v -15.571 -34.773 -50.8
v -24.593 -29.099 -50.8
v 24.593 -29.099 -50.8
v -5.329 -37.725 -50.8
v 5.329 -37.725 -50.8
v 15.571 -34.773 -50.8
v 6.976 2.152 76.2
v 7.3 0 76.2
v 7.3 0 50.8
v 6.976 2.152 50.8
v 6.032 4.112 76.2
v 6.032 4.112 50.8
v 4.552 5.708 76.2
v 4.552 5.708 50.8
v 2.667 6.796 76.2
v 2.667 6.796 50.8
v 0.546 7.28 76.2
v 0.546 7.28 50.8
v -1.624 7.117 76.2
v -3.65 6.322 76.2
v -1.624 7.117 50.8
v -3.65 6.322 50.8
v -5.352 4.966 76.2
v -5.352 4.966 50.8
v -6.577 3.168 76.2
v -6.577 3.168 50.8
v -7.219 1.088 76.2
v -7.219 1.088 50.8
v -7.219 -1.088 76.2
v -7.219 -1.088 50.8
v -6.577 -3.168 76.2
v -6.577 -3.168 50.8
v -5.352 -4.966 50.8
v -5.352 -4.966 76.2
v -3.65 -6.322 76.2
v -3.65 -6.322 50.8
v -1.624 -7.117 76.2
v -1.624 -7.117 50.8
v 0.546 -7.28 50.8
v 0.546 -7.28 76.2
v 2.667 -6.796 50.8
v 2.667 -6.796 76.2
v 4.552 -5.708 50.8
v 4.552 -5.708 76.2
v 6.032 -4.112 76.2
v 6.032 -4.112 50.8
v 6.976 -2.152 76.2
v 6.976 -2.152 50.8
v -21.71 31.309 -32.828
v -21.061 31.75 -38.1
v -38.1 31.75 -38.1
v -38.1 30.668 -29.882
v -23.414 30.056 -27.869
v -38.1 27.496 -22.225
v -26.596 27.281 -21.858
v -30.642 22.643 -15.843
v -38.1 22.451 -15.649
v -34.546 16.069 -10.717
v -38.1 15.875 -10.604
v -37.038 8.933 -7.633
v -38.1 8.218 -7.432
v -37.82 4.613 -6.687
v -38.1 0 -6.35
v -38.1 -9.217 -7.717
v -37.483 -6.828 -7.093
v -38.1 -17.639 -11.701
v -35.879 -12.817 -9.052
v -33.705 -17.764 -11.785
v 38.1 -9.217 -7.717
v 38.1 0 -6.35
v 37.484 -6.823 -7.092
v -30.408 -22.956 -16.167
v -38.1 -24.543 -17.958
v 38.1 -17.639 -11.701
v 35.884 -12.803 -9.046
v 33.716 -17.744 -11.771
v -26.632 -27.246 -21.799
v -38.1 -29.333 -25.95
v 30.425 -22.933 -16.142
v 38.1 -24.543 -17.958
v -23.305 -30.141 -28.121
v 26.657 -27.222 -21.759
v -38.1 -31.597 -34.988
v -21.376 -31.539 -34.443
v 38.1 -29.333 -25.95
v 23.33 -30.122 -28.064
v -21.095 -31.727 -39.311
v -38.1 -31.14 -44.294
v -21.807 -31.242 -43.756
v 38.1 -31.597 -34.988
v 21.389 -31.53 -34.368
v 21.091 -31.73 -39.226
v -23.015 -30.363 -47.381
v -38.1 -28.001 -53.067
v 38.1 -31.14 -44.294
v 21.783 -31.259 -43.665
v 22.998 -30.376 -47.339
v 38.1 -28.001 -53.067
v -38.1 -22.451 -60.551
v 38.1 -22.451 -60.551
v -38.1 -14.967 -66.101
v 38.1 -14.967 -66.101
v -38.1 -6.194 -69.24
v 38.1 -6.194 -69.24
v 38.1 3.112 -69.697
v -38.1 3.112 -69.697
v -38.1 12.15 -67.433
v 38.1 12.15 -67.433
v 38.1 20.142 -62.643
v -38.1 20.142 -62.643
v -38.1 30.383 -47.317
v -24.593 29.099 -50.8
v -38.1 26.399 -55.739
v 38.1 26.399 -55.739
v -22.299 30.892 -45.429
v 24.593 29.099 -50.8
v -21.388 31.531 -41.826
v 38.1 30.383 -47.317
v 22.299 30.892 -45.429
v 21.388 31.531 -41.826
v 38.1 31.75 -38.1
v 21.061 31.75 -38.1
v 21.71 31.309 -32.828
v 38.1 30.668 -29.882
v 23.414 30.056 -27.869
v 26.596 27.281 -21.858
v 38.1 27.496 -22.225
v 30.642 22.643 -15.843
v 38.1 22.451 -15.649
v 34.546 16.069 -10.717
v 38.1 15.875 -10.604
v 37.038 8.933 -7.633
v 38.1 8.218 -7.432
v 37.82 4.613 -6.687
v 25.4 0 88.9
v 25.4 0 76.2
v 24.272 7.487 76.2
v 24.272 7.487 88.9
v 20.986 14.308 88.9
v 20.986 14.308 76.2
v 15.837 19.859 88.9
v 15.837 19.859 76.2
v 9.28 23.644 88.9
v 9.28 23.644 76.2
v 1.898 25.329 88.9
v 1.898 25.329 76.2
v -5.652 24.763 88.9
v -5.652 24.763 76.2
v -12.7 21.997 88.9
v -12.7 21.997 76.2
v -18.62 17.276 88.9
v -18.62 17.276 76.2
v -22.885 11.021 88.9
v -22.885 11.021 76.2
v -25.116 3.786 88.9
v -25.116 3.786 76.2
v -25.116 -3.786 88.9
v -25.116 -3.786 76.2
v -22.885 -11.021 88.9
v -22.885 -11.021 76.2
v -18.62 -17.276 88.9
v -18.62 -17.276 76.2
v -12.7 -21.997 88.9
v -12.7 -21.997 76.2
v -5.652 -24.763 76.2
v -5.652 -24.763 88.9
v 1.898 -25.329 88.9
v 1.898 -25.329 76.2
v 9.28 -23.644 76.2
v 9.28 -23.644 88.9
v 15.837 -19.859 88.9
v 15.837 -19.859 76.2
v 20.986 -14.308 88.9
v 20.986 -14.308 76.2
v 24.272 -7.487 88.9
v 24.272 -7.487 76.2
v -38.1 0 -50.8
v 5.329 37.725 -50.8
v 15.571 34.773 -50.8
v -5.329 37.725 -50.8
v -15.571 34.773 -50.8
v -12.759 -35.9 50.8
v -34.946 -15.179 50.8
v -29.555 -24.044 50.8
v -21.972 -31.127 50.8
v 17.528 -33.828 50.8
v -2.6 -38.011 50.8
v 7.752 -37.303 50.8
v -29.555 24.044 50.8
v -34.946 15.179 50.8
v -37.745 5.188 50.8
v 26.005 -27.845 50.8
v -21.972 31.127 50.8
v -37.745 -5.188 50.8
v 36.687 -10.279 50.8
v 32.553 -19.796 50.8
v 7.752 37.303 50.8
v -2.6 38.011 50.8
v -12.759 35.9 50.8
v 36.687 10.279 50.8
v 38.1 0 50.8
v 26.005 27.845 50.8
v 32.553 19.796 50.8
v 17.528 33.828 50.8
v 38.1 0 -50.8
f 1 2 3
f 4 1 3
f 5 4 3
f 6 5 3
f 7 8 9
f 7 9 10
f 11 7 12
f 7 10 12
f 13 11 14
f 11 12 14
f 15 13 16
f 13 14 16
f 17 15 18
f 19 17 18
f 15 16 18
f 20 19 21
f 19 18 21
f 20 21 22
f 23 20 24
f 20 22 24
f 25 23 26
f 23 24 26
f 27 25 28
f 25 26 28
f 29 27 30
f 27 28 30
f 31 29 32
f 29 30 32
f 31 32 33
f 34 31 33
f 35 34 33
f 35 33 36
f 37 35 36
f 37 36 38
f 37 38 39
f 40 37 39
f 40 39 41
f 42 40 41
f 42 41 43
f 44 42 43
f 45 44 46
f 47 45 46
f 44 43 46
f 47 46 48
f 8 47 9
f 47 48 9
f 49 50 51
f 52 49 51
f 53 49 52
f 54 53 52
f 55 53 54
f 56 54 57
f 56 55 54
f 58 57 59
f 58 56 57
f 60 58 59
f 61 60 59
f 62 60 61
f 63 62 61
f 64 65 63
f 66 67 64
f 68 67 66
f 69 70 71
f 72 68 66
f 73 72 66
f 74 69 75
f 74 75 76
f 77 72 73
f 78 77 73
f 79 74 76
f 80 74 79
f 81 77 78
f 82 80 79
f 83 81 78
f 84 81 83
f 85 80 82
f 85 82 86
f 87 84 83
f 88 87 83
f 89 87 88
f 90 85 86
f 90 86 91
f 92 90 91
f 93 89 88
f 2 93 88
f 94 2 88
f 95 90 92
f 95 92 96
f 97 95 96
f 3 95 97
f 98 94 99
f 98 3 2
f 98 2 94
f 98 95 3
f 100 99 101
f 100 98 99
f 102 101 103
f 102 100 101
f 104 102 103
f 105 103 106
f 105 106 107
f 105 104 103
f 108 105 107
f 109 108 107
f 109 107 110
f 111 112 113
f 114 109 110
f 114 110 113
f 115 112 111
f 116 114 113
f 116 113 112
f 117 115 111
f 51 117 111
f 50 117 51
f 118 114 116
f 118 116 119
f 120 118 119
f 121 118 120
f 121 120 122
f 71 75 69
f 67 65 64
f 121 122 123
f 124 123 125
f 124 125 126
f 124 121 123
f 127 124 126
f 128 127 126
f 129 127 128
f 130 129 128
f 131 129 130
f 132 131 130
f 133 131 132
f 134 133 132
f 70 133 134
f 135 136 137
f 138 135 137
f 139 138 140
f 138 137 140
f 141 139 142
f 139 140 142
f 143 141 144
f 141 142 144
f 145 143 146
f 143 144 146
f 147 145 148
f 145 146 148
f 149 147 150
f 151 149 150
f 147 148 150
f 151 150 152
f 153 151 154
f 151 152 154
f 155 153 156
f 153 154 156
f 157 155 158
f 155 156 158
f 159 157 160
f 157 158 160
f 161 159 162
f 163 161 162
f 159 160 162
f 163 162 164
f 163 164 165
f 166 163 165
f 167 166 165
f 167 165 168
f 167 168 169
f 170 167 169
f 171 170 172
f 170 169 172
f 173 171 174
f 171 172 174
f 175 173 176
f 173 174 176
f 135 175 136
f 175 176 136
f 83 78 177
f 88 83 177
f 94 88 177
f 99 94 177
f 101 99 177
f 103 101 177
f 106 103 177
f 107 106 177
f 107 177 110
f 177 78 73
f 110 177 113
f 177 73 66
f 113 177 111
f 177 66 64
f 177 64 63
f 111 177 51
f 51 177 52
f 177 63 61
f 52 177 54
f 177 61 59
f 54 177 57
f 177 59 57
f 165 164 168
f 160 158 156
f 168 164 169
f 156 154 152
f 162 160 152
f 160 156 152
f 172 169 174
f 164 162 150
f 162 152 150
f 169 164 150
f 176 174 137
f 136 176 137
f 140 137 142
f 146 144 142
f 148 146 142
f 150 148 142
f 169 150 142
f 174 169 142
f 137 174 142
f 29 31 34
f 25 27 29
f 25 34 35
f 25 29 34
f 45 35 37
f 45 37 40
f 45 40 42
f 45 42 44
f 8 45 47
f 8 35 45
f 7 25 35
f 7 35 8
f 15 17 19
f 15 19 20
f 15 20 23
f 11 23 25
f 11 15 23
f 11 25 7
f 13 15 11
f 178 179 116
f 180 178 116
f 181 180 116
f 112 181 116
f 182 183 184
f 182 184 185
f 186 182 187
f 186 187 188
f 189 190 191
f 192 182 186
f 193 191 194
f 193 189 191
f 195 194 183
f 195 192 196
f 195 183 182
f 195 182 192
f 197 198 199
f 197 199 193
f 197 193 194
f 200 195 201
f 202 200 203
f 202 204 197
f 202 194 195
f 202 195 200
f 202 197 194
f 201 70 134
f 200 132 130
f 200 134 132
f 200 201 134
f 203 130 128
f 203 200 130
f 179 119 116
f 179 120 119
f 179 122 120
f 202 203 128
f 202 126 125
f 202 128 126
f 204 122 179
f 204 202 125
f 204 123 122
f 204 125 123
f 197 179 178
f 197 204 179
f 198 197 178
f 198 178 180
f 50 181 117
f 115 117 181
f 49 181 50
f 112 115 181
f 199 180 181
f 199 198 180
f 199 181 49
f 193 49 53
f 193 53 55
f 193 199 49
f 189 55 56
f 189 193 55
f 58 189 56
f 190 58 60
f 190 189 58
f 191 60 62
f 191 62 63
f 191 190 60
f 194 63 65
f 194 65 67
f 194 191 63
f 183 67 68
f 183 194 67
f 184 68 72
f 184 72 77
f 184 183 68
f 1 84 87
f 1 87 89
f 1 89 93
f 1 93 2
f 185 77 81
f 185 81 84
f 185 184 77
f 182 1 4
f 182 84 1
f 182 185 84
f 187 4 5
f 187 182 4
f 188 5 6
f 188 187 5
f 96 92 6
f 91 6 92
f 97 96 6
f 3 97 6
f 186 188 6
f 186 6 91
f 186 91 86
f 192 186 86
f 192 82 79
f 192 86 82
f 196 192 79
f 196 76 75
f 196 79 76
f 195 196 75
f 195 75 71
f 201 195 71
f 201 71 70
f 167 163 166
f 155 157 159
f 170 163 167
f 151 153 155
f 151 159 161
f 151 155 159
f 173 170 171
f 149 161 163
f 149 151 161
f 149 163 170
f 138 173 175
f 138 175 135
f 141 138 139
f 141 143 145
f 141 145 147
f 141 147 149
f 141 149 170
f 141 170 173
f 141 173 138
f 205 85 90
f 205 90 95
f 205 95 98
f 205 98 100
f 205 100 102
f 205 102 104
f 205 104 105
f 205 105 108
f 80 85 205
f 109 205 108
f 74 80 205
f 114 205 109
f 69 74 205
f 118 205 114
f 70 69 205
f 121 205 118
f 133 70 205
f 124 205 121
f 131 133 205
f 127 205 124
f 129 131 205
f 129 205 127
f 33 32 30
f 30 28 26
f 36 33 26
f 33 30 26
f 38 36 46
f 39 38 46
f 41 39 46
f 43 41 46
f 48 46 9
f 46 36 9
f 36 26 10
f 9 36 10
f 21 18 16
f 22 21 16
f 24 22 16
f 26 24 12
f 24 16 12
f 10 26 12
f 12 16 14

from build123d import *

# Parameters (mm, degrees)
F0_R     = 38.1
F1_DEPTH = 50.8
F2_R     = 31.75
F3_DEPTH = 38.1
F4_R     = 7.300399
F5_DEPTH = 25.4
F6_R     = 25.4
F7_DEPTH = 12.7


with BuildPart() as f1:
    # F0 (on Top) → F1 (new body, symmetric)
    with BuildSketch(Plane.XY):
        Circle(F0_R)
    extrude(amount=F1_DEPTH, both=True)

    # F2 (on Right) → F3 (join, symmetric)
    with BuildSketch(Plane.YZ):
        with Locations((0, -38.1)):
            Circle(F2_R)
    extrude(amount=F3_DEPTH, both=True)


with BuildPart() as f5:
    # F4 (on face) → F5 (new body)
    with BuildSketch(Plane.XY.offset(50.8)):
        Circle(F4_R)
    extrude(amount=F5_DEPTH)


with BuildPart() as f7:
    # F6 (on face) → F7 (new body)
    with BuildSketch(Plane.XY.offset(76.2)):
        Circle(F6_R)
    extrude(amount=F7_DEPTH)


solid = Compound([f1.part, f5.part, f7.part])
